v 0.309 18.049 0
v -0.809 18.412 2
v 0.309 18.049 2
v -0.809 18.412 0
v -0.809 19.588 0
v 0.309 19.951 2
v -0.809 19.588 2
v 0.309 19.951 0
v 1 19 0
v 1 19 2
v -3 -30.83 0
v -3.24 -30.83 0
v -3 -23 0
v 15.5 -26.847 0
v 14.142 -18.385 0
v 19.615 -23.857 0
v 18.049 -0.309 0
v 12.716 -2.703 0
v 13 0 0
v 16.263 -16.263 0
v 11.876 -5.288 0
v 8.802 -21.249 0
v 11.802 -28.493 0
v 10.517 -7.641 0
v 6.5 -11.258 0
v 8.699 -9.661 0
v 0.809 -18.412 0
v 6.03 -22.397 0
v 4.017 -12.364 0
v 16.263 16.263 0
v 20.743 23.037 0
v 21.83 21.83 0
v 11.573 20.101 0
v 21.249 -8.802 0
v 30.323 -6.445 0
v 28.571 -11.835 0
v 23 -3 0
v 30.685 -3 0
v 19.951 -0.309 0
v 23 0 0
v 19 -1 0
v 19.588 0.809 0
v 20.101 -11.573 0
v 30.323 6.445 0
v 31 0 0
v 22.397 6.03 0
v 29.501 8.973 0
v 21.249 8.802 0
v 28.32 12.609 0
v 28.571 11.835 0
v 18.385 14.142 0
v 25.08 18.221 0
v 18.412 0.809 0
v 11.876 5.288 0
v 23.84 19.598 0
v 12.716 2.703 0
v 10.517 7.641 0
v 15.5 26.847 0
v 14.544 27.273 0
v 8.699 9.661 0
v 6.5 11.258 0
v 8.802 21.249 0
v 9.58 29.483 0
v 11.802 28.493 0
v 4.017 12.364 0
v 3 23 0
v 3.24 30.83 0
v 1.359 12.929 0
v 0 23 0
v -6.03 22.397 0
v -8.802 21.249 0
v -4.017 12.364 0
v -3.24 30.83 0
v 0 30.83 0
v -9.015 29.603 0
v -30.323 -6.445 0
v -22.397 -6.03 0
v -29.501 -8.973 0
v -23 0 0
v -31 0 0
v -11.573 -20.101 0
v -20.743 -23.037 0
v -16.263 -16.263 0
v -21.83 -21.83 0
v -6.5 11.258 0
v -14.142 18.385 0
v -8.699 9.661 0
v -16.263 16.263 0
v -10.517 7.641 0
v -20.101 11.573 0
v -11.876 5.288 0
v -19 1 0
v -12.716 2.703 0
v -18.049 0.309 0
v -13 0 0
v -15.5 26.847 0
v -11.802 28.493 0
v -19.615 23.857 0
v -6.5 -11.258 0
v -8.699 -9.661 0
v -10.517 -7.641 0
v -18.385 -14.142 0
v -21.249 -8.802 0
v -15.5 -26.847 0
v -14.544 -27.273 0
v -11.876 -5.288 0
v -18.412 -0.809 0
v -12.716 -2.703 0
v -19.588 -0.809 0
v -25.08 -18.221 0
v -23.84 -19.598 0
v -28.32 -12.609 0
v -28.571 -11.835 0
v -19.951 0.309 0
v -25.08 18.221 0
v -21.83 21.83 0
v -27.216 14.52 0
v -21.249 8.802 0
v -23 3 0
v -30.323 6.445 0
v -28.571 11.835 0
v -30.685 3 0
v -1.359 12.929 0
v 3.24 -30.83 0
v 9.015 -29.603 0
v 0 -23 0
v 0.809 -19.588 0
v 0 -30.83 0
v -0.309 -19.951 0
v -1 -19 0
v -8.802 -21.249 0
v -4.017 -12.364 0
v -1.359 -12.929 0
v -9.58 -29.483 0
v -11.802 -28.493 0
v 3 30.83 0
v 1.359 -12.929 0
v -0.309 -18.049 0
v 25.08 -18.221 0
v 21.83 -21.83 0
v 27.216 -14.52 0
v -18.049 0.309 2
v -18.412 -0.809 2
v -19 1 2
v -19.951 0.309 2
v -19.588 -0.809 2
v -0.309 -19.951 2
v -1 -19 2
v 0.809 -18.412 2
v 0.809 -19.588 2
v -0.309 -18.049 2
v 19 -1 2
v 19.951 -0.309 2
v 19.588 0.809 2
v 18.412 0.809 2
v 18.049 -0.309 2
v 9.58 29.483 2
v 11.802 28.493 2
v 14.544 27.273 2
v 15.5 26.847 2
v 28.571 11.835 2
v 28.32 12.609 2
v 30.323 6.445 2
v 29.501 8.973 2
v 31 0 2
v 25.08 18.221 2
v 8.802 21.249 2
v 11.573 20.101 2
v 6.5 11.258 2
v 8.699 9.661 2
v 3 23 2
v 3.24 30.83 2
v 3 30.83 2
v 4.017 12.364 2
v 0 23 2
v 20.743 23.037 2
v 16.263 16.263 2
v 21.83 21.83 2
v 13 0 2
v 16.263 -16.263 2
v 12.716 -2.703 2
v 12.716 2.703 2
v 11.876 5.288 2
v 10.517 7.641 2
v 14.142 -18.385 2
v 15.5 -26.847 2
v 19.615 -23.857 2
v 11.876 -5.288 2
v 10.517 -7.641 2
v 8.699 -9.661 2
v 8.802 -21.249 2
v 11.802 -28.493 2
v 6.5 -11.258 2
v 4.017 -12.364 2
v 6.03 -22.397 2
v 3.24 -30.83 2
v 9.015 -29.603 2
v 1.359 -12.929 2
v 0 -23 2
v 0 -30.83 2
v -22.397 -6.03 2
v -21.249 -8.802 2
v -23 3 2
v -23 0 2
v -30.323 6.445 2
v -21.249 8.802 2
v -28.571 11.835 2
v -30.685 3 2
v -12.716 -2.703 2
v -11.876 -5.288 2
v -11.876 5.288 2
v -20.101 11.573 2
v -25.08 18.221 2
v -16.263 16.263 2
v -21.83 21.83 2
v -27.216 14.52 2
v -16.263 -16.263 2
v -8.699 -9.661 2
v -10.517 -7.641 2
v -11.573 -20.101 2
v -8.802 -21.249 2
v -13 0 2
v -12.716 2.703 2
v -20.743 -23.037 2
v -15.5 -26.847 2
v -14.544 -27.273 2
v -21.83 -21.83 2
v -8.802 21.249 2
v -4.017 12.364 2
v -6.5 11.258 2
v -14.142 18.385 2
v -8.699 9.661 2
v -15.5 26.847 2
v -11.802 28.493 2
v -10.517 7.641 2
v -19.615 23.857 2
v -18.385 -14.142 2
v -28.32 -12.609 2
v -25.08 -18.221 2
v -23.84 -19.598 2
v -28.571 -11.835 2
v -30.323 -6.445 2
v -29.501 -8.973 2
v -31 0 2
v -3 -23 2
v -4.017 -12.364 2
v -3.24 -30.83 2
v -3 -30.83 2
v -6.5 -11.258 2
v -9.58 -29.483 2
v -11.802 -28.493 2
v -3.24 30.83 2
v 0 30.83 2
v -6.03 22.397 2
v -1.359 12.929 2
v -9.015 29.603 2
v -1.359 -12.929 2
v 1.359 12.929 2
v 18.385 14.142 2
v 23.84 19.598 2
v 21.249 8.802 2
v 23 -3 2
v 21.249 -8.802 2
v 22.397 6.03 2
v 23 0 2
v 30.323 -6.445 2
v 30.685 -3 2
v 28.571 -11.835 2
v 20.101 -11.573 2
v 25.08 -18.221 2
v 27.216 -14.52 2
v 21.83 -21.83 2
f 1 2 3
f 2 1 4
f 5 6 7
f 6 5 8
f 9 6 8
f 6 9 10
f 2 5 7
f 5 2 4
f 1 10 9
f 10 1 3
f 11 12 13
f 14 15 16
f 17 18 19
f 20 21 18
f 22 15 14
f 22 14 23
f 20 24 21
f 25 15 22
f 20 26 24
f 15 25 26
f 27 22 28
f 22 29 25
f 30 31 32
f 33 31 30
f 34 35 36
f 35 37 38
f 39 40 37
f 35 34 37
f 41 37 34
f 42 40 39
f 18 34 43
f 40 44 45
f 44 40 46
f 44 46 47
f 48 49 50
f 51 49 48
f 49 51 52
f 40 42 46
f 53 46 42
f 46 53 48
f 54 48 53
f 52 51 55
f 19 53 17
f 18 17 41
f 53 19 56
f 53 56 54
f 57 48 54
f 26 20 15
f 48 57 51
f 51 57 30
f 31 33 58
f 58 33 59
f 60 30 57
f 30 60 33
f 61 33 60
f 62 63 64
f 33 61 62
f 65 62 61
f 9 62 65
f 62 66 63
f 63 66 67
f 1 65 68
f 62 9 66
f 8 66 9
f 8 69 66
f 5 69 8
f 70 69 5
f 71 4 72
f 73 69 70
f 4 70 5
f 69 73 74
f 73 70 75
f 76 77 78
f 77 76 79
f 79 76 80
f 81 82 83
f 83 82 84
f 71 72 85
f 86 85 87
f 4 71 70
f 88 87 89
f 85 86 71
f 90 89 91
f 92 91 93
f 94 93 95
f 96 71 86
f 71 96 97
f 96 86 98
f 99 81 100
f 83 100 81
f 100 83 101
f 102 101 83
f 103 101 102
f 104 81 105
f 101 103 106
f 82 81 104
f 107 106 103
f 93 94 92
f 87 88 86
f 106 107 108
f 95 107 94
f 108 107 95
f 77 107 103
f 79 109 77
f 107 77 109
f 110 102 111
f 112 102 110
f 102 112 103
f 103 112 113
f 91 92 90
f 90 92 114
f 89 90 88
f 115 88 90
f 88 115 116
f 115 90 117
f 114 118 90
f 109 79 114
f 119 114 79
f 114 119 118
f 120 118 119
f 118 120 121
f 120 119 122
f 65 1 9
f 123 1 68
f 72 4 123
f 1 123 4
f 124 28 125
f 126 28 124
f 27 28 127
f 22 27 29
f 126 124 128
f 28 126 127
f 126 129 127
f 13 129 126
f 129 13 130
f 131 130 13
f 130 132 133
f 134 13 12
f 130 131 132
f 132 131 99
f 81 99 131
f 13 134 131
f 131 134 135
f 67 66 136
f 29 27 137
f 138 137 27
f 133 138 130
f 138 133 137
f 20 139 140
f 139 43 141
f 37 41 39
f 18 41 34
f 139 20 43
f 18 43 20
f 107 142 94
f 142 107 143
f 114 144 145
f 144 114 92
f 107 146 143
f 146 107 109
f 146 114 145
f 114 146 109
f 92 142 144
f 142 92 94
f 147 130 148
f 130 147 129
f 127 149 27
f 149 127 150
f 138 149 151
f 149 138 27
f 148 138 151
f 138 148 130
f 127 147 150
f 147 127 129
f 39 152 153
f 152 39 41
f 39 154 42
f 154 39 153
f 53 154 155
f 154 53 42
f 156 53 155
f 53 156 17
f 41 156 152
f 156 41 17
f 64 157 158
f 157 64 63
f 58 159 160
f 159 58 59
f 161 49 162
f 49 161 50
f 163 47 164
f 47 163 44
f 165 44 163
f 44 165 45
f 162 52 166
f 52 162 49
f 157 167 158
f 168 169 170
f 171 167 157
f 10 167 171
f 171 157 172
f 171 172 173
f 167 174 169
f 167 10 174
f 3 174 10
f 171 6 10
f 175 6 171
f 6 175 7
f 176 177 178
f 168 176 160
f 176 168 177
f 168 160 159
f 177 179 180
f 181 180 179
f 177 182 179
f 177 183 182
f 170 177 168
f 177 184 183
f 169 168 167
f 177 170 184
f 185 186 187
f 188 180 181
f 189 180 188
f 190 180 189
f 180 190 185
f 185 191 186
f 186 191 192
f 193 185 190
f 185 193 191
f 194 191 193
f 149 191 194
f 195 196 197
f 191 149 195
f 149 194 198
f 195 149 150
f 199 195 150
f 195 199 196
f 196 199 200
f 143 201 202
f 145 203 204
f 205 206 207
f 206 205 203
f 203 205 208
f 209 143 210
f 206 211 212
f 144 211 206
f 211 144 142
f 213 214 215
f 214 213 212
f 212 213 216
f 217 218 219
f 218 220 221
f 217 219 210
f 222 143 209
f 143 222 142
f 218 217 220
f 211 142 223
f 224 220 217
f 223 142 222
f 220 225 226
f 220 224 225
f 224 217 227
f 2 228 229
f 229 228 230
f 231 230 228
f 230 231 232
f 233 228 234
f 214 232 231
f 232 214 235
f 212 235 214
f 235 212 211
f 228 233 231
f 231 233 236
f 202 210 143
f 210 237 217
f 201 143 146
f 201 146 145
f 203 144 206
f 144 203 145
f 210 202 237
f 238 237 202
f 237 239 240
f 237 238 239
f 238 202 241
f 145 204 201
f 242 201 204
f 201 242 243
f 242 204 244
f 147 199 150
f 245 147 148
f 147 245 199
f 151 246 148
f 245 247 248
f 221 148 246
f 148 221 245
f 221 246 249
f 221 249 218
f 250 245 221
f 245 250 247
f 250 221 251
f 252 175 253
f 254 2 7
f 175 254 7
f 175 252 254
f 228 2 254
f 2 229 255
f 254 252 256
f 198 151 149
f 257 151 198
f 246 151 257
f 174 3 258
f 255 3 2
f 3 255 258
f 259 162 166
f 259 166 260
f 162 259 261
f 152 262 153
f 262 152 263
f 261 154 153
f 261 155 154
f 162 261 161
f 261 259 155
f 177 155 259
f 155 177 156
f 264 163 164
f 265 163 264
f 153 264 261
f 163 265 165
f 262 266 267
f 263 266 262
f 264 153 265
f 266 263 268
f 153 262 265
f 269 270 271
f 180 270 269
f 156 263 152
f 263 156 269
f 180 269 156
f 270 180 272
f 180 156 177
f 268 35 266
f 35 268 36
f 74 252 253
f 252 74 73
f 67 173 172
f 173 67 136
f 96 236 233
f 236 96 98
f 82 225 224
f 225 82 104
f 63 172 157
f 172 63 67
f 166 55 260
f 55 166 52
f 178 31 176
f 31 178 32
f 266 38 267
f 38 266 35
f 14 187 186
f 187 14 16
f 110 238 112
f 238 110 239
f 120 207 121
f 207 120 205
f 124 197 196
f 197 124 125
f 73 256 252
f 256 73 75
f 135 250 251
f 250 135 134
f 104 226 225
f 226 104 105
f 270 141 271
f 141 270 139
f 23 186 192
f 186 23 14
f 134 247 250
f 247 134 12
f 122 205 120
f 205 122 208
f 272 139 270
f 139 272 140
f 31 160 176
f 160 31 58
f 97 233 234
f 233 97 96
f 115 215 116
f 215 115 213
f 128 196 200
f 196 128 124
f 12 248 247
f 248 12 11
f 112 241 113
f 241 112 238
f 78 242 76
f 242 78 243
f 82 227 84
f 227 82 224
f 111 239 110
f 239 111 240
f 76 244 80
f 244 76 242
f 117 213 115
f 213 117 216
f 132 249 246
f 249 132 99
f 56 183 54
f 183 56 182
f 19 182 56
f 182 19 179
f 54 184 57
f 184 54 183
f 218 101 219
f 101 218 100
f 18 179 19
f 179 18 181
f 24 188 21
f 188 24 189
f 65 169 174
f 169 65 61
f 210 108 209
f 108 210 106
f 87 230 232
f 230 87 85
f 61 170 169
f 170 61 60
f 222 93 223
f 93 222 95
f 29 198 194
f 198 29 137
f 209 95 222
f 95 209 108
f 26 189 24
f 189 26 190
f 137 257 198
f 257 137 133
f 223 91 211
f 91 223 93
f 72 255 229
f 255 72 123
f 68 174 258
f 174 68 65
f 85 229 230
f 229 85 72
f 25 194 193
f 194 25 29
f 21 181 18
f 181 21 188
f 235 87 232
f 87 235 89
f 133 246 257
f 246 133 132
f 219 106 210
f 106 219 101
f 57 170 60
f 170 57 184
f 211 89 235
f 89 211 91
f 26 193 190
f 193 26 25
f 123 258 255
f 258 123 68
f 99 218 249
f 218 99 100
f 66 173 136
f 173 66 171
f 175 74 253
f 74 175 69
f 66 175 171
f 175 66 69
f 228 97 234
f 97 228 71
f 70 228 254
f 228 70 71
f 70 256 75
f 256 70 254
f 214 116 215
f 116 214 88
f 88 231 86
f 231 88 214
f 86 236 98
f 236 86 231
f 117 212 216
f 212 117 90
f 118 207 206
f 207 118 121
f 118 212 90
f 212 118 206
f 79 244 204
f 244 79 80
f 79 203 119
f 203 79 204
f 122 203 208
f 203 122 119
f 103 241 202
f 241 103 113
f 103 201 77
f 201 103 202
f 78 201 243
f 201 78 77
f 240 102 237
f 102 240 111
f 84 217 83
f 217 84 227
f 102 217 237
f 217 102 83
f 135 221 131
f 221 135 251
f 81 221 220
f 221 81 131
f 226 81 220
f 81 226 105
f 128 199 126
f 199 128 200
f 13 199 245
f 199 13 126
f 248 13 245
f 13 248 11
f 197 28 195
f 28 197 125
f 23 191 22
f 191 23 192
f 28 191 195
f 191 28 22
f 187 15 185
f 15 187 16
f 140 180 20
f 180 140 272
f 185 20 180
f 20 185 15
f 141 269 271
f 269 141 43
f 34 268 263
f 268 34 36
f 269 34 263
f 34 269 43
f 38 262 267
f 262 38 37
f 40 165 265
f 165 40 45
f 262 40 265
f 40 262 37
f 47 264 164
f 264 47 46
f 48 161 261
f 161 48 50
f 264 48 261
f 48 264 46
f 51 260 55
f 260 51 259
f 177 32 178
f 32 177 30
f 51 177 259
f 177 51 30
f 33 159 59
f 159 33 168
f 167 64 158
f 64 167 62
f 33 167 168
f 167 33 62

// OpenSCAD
difference() {

 difference() {
  difference() {
   cylinder(2,31,31);
   for ( a = [0:90:340])   
    rotate([0,0,a]) 
    translate([0,19,0]){
     cylinder(3,1,1);
    }
  }
  cylinder(3,13,13);
 }
 
 for ( a = [0:22.5:340])   
 rotate([0,0,a]) 
 translate([0,23,0]){
  cube([3,8,3]);
 }

}
